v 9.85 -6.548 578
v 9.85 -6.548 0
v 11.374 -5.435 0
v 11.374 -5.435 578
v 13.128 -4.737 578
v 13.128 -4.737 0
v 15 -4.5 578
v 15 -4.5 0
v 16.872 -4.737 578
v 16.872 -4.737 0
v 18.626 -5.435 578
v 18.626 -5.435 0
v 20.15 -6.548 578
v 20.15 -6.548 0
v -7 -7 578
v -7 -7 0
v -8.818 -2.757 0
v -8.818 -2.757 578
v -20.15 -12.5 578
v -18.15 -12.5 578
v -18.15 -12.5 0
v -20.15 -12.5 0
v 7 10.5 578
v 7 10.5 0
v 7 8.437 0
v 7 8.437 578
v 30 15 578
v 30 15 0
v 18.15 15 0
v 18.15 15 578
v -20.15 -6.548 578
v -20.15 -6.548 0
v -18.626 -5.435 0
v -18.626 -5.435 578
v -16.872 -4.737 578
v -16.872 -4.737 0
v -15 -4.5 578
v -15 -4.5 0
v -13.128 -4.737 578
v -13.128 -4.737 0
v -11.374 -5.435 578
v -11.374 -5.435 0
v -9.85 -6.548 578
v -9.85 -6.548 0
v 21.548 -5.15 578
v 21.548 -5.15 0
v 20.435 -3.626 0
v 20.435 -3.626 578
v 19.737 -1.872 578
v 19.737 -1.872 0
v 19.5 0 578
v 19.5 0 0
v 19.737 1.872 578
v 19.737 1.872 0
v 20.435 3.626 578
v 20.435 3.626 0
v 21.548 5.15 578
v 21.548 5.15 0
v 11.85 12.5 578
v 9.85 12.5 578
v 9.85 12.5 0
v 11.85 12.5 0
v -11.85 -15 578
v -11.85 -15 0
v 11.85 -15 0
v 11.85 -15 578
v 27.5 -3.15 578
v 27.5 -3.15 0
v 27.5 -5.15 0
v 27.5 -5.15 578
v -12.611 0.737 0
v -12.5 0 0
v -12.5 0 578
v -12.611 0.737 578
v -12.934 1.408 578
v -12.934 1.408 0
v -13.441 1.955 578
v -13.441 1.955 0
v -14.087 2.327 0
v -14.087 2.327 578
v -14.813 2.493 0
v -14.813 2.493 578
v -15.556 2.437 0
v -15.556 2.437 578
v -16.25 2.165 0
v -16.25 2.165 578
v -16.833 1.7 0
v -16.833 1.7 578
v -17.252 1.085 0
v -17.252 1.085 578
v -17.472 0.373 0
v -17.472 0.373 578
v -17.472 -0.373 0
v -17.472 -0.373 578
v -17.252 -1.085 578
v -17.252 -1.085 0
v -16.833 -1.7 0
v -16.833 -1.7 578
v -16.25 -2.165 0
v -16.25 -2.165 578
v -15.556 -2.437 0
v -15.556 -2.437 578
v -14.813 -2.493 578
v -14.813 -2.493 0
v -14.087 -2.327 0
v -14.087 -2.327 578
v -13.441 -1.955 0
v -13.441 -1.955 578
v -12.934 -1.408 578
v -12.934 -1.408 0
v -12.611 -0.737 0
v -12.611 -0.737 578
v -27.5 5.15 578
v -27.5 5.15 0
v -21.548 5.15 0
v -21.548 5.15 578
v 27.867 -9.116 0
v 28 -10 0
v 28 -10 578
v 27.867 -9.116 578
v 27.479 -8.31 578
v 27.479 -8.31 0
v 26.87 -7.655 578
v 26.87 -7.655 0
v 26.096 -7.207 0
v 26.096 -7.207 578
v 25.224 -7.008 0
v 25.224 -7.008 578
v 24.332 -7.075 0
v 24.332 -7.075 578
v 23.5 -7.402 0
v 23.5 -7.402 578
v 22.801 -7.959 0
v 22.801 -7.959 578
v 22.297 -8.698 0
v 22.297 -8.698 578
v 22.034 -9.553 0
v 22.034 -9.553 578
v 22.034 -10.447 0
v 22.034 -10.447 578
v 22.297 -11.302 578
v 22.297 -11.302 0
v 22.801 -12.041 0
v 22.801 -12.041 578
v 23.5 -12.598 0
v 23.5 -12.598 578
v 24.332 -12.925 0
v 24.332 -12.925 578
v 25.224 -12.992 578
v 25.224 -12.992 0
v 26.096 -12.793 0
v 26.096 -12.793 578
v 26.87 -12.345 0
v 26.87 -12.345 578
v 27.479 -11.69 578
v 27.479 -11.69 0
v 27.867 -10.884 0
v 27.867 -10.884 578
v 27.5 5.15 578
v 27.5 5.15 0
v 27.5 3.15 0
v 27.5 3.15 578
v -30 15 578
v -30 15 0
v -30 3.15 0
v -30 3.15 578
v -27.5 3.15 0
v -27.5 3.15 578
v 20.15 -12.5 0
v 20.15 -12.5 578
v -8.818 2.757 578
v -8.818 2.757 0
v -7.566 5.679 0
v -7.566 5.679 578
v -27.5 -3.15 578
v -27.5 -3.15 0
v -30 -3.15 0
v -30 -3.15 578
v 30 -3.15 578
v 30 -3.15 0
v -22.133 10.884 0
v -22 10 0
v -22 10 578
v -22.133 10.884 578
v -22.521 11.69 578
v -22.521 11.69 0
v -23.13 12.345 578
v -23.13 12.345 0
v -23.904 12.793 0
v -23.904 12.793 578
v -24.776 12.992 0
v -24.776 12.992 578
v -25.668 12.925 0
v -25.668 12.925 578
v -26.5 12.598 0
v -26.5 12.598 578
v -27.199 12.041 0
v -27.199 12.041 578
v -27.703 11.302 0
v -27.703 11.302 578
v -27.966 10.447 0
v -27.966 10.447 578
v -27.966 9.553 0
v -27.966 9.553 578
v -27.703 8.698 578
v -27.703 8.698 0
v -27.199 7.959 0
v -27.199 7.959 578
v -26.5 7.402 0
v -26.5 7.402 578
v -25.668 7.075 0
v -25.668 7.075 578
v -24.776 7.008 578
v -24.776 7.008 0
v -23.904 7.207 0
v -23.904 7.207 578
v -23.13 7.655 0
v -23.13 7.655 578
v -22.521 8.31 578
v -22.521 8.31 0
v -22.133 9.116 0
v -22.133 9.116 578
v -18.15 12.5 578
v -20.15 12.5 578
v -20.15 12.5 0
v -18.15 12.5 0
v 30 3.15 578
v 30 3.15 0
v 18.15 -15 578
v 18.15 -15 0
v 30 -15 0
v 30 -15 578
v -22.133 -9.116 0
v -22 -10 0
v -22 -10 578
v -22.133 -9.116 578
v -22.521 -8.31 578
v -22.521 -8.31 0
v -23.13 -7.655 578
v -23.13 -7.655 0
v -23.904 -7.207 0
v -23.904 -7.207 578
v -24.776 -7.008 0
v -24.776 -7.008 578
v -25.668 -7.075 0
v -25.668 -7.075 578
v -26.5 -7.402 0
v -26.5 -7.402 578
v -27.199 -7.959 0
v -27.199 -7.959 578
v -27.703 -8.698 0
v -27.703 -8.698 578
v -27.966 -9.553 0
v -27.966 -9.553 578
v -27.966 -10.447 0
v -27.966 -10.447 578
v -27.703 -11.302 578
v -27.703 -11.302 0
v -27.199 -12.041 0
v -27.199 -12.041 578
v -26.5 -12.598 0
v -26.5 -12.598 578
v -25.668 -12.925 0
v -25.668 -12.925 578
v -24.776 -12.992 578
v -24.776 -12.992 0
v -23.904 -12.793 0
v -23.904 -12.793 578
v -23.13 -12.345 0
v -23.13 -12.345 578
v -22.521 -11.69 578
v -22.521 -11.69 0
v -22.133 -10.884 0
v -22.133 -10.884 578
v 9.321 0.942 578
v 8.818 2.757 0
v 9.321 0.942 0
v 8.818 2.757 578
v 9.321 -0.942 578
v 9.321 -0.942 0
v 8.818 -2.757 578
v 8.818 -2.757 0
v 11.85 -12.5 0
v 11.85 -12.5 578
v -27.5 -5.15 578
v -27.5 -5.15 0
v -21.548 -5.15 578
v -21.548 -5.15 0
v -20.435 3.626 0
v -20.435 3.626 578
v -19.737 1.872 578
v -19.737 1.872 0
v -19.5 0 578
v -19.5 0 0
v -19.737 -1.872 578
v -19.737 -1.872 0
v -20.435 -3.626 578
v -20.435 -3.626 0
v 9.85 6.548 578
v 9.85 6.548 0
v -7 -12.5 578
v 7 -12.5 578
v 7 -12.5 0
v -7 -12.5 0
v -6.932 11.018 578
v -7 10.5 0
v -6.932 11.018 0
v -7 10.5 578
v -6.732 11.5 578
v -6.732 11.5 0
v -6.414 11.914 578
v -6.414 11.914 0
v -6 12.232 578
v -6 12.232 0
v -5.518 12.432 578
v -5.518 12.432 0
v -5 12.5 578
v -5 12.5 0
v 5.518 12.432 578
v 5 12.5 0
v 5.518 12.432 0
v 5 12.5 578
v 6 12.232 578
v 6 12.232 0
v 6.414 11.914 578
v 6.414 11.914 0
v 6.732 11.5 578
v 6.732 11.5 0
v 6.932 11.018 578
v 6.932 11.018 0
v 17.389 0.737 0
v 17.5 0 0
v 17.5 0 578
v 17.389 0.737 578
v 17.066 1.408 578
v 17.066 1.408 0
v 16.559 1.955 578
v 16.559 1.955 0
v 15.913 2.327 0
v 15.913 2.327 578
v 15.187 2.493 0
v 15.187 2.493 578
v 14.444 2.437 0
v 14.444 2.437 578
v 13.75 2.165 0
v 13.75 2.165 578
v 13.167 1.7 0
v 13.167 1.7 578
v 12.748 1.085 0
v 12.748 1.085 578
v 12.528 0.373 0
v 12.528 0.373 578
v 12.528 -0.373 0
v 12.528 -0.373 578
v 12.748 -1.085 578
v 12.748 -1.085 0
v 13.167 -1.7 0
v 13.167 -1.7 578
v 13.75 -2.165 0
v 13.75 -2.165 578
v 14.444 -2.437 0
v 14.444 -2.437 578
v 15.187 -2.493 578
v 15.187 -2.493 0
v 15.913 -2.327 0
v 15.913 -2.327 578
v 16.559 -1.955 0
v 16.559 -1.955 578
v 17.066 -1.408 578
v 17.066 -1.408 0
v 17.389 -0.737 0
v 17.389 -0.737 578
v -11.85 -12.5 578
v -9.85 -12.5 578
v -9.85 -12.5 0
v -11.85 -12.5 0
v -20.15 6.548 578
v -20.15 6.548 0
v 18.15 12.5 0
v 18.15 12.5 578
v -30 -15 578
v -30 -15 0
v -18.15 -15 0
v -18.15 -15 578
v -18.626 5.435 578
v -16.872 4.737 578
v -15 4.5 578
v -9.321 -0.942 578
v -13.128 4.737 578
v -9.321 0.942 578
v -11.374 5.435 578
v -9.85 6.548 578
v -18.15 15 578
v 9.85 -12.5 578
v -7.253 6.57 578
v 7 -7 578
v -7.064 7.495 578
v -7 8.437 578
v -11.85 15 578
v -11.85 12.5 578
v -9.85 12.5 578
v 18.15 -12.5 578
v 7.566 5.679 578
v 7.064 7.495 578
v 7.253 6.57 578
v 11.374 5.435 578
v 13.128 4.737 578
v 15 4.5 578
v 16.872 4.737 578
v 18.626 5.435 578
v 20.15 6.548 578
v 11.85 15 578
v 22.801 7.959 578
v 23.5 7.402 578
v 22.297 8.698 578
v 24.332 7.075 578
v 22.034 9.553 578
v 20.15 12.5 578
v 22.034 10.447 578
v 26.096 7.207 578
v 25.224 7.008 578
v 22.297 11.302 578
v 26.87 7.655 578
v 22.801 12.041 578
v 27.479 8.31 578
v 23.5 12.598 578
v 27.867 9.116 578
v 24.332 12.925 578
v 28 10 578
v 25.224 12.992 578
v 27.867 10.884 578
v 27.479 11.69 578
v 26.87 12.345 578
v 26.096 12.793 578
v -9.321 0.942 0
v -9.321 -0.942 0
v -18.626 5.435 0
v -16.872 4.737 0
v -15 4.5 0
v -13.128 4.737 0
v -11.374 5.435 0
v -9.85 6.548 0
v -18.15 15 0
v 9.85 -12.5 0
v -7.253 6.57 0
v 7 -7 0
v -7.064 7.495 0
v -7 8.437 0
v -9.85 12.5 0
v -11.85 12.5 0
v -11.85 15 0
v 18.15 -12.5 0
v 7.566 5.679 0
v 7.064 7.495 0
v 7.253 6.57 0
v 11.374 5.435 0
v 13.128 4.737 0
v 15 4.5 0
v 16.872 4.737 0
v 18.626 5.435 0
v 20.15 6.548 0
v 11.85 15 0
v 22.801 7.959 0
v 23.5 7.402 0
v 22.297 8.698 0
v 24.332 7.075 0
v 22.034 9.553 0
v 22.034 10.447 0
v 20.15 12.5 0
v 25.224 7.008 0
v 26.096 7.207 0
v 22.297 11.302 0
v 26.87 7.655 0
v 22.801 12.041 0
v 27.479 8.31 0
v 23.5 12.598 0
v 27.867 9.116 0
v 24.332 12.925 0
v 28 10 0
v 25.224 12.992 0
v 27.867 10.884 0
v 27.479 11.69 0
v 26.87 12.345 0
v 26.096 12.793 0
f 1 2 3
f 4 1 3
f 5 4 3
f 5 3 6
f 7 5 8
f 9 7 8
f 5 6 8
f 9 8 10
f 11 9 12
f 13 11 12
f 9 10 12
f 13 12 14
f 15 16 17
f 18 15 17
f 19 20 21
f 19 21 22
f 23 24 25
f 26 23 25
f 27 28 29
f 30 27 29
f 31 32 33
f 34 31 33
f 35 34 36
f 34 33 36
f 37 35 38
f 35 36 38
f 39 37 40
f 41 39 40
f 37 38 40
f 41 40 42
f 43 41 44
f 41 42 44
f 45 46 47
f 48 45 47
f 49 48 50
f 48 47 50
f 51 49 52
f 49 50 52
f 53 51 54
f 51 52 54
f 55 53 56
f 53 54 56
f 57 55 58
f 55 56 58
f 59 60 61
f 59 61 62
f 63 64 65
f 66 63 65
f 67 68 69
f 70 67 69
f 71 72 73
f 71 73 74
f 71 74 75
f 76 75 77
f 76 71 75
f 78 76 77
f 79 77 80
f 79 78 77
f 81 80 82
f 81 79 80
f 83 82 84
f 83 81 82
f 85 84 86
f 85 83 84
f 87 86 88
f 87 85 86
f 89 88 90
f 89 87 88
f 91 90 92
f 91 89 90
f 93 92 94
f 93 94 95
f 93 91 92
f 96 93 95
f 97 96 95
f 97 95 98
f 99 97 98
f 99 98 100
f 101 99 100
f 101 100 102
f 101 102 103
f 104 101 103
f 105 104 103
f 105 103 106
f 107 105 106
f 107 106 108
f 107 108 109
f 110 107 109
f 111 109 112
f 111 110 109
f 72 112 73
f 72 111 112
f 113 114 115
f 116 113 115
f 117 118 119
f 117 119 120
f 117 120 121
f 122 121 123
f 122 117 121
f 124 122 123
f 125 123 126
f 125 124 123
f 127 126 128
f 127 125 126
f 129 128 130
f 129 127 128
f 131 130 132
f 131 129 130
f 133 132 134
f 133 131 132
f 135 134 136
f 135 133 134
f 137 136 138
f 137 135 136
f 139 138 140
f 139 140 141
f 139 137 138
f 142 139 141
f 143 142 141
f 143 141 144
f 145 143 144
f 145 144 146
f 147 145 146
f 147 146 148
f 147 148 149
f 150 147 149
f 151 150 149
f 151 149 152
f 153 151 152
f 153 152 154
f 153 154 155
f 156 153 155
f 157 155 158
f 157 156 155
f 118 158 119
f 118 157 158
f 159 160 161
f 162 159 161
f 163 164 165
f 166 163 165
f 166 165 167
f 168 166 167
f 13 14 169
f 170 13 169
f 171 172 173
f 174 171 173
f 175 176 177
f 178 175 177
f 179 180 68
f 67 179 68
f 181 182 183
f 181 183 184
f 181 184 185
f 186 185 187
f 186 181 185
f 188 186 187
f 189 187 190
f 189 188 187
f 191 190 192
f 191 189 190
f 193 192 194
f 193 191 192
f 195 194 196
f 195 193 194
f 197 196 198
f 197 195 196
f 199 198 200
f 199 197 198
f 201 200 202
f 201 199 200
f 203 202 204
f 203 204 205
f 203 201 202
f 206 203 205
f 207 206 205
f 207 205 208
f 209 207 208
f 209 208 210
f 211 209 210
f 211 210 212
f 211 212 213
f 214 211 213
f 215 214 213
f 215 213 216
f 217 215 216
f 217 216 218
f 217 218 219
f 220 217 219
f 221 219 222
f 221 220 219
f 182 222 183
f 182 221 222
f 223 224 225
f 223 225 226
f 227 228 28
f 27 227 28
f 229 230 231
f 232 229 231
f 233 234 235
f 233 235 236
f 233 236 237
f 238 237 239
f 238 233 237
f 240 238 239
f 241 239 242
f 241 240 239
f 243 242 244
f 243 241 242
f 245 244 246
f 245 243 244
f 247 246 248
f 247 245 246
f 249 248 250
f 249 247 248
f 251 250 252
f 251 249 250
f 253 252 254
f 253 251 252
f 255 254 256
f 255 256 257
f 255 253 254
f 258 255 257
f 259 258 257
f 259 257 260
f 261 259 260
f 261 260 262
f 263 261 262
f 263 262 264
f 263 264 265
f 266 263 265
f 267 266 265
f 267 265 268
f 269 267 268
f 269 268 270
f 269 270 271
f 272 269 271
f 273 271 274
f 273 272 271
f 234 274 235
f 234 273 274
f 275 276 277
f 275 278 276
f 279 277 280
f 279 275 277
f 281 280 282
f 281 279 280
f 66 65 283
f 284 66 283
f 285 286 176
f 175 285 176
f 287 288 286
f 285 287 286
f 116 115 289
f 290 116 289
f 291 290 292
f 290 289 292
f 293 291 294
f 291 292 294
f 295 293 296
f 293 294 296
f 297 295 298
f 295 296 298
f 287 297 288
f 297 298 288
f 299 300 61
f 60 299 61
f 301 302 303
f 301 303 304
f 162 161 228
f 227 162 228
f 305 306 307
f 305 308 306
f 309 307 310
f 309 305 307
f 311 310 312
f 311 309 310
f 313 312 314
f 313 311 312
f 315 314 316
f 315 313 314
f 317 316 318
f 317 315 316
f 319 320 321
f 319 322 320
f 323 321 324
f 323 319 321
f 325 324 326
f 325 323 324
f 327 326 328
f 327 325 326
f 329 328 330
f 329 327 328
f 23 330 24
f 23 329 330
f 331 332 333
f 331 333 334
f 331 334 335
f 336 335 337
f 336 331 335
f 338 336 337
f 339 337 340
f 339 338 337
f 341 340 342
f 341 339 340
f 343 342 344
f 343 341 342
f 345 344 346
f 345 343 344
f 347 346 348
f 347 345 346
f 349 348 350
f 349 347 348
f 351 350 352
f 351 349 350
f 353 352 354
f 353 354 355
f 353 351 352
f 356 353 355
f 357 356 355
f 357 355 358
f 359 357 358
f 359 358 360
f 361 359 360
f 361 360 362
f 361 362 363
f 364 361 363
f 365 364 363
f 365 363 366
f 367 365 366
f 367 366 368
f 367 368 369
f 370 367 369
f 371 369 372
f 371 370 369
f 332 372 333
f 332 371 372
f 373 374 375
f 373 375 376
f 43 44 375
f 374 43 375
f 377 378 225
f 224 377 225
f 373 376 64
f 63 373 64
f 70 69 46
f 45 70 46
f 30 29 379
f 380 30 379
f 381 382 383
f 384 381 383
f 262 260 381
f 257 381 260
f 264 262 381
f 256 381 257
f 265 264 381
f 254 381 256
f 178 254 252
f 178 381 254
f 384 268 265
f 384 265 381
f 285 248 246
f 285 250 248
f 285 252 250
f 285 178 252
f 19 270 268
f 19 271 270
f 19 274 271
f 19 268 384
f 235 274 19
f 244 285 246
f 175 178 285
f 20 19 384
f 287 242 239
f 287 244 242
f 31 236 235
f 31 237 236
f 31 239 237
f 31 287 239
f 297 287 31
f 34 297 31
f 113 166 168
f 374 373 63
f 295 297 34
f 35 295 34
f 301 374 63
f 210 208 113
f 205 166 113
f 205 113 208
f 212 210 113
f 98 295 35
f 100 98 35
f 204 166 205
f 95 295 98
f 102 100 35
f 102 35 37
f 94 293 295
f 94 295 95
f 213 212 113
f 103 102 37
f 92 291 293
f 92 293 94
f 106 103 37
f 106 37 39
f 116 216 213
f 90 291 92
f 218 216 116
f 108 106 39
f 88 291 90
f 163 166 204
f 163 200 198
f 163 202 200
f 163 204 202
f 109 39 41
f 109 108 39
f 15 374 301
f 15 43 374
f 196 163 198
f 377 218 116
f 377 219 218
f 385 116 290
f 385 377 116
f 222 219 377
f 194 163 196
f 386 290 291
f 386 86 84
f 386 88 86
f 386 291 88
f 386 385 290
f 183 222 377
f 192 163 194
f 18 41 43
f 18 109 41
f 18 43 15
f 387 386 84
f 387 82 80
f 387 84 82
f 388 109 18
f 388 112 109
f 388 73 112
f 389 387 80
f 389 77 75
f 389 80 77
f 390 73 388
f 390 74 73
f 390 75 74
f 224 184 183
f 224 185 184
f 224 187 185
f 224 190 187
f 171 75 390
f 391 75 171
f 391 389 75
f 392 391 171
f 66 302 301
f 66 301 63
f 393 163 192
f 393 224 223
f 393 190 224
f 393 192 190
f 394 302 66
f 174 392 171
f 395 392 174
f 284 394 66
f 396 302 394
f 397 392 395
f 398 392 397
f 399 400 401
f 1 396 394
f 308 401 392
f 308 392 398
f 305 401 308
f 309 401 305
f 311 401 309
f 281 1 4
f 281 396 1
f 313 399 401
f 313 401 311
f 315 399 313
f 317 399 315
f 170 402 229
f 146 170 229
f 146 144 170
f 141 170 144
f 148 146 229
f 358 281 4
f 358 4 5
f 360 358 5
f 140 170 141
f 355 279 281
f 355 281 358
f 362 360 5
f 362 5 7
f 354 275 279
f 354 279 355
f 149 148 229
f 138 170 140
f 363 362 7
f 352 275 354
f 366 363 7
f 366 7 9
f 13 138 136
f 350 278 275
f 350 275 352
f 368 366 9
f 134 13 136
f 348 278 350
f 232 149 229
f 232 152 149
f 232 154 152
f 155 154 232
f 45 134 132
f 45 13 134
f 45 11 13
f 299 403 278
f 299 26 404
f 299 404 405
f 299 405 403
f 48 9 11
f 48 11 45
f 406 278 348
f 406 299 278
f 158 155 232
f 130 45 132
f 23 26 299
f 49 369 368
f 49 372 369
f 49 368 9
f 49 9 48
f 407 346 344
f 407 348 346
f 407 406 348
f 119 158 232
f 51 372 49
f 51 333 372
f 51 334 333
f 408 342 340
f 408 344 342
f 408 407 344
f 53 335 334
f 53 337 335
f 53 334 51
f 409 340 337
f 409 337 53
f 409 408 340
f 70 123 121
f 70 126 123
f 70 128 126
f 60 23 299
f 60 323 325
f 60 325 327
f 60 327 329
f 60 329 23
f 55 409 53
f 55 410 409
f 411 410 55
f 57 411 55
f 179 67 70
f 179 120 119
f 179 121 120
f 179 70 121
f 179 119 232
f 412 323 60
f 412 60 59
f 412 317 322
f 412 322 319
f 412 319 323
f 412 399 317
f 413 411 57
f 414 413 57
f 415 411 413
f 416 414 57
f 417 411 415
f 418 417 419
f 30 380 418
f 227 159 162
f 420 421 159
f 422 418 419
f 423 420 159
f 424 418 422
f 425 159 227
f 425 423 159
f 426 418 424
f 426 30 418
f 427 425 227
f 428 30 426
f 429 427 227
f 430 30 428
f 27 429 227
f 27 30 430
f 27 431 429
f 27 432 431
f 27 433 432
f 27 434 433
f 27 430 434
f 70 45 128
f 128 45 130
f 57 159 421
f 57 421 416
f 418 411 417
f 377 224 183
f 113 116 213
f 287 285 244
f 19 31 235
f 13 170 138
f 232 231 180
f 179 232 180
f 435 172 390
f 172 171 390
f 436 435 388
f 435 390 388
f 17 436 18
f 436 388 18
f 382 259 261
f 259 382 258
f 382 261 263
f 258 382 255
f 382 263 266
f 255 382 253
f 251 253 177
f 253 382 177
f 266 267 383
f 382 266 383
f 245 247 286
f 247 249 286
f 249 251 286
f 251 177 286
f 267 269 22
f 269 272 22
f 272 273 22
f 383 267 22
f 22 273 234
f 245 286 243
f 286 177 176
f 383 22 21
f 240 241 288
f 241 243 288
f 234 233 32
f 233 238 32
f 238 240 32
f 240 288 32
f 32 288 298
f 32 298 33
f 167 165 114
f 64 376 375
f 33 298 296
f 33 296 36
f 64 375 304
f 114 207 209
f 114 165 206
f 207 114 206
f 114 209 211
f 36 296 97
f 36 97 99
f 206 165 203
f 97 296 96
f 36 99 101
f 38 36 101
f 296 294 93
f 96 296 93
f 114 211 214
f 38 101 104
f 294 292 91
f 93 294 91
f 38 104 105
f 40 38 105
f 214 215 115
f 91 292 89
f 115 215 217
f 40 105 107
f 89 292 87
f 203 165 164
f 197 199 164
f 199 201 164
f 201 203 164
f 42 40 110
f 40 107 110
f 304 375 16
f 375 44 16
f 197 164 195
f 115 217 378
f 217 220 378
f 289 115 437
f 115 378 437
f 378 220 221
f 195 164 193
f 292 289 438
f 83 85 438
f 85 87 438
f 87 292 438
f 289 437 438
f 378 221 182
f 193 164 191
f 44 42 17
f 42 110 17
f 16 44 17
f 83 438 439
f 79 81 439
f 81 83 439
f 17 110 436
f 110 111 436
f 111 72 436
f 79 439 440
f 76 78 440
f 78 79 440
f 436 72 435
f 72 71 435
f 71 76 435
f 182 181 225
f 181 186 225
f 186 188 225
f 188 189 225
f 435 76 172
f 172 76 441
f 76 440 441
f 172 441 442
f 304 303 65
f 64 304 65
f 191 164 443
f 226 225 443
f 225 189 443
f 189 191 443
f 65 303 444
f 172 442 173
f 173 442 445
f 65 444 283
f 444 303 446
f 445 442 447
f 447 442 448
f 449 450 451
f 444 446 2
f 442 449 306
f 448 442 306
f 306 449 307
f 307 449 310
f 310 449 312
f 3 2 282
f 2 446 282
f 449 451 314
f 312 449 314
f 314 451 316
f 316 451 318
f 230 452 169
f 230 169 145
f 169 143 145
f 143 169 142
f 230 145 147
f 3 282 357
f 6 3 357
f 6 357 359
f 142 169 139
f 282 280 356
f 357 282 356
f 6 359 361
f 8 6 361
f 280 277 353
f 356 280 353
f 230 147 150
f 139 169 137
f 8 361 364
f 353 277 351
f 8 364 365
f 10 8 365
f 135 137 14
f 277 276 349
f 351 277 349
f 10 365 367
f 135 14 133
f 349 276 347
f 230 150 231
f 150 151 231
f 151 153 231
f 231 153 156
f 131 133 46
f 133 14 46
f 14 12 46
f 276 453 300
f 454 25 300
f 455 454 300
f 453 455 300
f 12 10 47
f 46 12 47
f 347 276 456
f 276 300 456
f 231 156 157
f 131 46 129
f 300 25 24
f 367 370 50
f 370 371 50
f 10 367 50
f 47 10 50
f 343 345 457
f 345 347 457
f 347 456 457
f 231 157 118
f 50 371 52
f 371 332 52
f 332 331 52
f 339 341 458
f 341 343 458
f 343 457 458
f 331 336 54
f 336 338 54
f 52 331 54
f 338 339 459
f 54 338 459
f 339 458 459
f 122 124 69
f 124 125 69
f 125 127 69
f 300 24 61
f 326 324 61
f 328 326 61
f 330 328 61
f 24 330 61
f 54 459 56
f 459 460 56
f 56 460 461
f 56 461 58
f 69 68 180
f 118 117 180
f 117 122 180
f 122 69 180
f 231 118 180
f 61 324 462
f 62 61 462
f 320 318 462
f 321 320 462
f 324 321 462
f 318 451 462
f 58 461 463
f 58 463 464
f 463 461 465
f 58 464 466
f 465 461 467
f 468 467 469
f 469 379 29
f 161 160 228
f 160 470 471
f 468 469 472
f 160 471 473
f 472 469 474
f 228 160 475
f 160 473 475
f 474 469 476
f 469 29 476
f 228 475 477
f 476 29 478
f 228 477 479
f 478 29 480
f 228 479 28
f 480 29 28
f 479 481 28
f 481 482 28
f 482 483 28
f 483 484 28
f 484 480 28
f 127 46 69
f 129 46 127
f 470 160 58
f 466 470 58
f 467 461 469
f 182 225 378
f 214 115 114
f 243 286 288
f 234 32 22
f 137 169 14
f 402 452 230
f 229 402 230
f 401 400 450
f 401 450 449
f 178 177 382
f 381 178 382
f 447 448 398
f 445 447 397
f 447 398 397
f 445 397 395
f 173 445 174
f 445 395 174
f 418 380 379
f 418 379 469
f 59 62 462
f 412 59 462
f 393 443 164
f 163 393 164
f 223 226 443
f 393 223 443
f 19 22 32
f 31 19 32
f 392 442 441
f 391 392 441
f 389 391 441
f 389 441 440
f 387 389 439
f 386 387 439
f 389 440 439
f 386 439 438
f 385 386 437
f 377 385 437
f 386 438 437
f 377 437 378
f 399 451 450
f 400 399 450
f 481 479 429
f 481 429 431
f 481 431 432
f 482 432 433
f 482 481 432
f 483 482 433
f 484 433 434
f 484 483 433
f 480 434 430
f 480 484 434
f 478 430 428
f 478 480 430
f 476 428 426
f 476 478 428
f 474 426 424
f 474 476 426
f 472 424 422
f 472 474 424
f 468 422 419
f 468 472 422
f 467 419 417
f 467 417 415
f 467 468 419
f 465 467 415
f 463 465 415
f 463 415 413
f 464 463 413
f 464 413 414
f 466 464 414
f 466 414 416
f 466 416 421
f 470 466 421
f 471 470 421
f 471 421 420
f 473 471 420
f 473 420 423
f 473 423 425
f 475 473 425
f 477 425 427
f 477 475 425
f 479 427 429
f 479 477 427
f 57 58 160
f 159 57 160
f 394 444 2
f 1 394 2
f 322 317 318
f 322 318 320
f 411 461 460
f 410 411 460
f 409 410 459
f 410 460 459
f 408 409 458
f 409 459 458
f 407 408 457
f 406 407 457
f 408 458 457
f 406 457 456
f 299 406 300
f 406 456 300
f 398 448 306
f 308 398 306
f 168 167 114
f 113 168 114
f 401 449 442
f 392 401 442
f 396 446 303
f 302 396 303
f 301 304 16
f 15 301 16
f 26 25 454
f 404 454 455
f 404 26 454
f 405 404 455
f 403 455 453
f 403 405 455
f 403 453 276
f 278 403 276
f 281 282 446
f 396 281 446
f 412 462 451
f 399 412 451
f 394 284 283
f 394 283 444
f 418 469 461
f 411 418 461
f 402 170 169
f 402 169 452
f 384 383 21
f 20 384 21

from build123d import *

# Parameters (mm, degrees)
F0_R     = 3
F0_R_2   = 2.5
F1_DEPTH = 578
F2_R     = 2
F3_R     = 7


# Not quite as in the source:
# - a feature names something its author has since deleted; it is built from what else it names


with BuildPart() as f1:
    # F0 (on Top) → F1 (new body)
    with BuildSketch(Plane.XY):
        with BuildLine():
            Line((18.15, -15), (30, -15))
            Line((30, -15), (30, -3.15))
            Line((30, -3.15), (27.5, -3.15))
            Line((27.5, -3.15), (27.5, -5.15))
            Line((27.5, -5.15), (21.5477069044, -5.15))
            ThreePointArc((21.5477069044, -5.15), (19.5, 0), (21.5477069044, 5.15))
            Line((21.5477069044, 5.15), (27.5, 5.15))
            Line((27.5, 5.15), (27.5, 3.15))
            Line((27.5, 3.15), (30, 3.15))
            Line((30, 3.15), (30, 15))
            Line((30, 15), (18.15, 15))
            Line((18.15, 15), (18.15, 12.5))
            Line((18.15, 12.5), (20.15, 12.5))
            Line((20.15, 12.5), (20.15, 6.5477069044))
            ThreePointArc((20.15, 6.5477069044), (15, 4.5), (9.85, 6.5477069044))
            Line((9.85, 6.5477069044), (9.85, 12.5))
            Line((9.85, 12.5), (11.85, 12.5))
            Line((11.85, 12.5), (11.85, 15))
            Line((11.85, 15), (-11.85, 15))
            Line((-11.85, 15), (-11.85, 12.5))
            Line((-11.85, 12.5), (-9.85, 12.5))
            Line((-9.85, 12.5), (-9.85, 6.5477069044))
            ThreePointArc((-9.85, 6.5477069044), (-15, 4.5), (-20.15, 6.5477069044))
            Line((-20.15, 6.5477069044), (-20.15, 12.5))
            Line((-20.15, 12.5), (-18.15, 12.5))
            Line((-18.15, 12.5), (-18.15, 15))
            Line((-18.15, 15), (-30, 15))
            Line((-30, 15), (-30, 3.15))
            Line((-30, 3.15), (-27.5, 3.15))
            Line((-27.5, 3.15), (-27.5, 5.15))
            Line((-27.5, 5.15), (-21.5477069044, 5.15))
            ThreePointArc((-21.5477069044, 5.15), (-19.5, 0), (-21.5477069044, -5.15))
            Line((-21.5477069044, -5.15), (-27.5, -5.15))
            Line((-27.5, -5.15), (-27.5, -3.15))
            Line((-27.5, -3.15), (-30, -3.15))
            Line((-30, -3.15), (-30, -15))
            Line((-30, -15), (-18.15, -15))
            Line((-18.15, -15), (-18.15, -12.5))
            Line((-18.15, -12.5), (-20.15, -12.5))
            Line((-20.15, -12.5), (-20.15, -6.5477069044))
            ThreePointArc((-20.15, -6.5477069044), (-15, -4.5), (-9.85, -6.5477069044))
            Line((-9.85, -6.5477069044), (-9.85, -12.5))
            Line((-9.85, -12.5), (-11.85, -12.5))
            Line((-11.85, -12.5), (-11.85, -15))
            Line((-11.85, -15), (11.85, -15))
            Line((11.85, -15), (11.85, -12.5))
            Line((11.85, -12.5), (9.85, -12.5))
            Line((9.85, -12.5), (9.85, -6.5477069044))
            ThreePointArc((9.85, -6.5477069044), (15, -4.5), (20.15, -6.5477069044))
            Line((20.15, -6.5477069044), (20.15, -12.5))
            Line((20.15, -12.5), (18.15, -12.5))
            Line((18.15, -12.5), (18.15, -15))
        make_face()
        with Locations((-25, -10)):
            Circle(F0_R, mode=Mode.SUBTRACT)
        with Locations((25, -10)):
            Circle(F0_R, mode=Mode.SUBTRACT)
        with Locations((-15, 0)):
            Circle(F0_R_2, mode=Mode.SUBTRACT)
        with Locations((-25, 10)):
            Circle(F0_R, mode=Mode.SUBTRACT)
        Polygon((-7, 7), (-7, 12.5), (0, 12.5), (7, 12.5), (7, 7), (10, 0), (7, -7), (7, -12.5), (0, -12.5), (-7, -12.5), (-7, -7), (-10, 0), align=None, mode=Mode.SUBTRACT)
        with Locations((15, 0)):
            Circle(F0_R_2, mode=Mode.SUBTRACT)
        with Locations((25, 10)):
            Circle(F0_R, mode=Mode.SUBTRACT)
    extrude(amount=F1_DEPTH)

    # F2
    f2_edges = [f1.edges().sort_by_distance(p)[0] for p in [
        (-7, 12.5, 289),
        (7, 12.5, 289),
    ]]
    fillet(f2_edges, radius=F2_R)

    # F3
    f3_edges = [f1.edges().sort_by_distance(p)[0] for p in [
        (-7, 7, 289),
        (-10, 0, 289),
        (7, 7, 289),
        (10, 0, 289),
    ]]
    fillet(f3_edges, radius=F3_R)


solid = f1.part
